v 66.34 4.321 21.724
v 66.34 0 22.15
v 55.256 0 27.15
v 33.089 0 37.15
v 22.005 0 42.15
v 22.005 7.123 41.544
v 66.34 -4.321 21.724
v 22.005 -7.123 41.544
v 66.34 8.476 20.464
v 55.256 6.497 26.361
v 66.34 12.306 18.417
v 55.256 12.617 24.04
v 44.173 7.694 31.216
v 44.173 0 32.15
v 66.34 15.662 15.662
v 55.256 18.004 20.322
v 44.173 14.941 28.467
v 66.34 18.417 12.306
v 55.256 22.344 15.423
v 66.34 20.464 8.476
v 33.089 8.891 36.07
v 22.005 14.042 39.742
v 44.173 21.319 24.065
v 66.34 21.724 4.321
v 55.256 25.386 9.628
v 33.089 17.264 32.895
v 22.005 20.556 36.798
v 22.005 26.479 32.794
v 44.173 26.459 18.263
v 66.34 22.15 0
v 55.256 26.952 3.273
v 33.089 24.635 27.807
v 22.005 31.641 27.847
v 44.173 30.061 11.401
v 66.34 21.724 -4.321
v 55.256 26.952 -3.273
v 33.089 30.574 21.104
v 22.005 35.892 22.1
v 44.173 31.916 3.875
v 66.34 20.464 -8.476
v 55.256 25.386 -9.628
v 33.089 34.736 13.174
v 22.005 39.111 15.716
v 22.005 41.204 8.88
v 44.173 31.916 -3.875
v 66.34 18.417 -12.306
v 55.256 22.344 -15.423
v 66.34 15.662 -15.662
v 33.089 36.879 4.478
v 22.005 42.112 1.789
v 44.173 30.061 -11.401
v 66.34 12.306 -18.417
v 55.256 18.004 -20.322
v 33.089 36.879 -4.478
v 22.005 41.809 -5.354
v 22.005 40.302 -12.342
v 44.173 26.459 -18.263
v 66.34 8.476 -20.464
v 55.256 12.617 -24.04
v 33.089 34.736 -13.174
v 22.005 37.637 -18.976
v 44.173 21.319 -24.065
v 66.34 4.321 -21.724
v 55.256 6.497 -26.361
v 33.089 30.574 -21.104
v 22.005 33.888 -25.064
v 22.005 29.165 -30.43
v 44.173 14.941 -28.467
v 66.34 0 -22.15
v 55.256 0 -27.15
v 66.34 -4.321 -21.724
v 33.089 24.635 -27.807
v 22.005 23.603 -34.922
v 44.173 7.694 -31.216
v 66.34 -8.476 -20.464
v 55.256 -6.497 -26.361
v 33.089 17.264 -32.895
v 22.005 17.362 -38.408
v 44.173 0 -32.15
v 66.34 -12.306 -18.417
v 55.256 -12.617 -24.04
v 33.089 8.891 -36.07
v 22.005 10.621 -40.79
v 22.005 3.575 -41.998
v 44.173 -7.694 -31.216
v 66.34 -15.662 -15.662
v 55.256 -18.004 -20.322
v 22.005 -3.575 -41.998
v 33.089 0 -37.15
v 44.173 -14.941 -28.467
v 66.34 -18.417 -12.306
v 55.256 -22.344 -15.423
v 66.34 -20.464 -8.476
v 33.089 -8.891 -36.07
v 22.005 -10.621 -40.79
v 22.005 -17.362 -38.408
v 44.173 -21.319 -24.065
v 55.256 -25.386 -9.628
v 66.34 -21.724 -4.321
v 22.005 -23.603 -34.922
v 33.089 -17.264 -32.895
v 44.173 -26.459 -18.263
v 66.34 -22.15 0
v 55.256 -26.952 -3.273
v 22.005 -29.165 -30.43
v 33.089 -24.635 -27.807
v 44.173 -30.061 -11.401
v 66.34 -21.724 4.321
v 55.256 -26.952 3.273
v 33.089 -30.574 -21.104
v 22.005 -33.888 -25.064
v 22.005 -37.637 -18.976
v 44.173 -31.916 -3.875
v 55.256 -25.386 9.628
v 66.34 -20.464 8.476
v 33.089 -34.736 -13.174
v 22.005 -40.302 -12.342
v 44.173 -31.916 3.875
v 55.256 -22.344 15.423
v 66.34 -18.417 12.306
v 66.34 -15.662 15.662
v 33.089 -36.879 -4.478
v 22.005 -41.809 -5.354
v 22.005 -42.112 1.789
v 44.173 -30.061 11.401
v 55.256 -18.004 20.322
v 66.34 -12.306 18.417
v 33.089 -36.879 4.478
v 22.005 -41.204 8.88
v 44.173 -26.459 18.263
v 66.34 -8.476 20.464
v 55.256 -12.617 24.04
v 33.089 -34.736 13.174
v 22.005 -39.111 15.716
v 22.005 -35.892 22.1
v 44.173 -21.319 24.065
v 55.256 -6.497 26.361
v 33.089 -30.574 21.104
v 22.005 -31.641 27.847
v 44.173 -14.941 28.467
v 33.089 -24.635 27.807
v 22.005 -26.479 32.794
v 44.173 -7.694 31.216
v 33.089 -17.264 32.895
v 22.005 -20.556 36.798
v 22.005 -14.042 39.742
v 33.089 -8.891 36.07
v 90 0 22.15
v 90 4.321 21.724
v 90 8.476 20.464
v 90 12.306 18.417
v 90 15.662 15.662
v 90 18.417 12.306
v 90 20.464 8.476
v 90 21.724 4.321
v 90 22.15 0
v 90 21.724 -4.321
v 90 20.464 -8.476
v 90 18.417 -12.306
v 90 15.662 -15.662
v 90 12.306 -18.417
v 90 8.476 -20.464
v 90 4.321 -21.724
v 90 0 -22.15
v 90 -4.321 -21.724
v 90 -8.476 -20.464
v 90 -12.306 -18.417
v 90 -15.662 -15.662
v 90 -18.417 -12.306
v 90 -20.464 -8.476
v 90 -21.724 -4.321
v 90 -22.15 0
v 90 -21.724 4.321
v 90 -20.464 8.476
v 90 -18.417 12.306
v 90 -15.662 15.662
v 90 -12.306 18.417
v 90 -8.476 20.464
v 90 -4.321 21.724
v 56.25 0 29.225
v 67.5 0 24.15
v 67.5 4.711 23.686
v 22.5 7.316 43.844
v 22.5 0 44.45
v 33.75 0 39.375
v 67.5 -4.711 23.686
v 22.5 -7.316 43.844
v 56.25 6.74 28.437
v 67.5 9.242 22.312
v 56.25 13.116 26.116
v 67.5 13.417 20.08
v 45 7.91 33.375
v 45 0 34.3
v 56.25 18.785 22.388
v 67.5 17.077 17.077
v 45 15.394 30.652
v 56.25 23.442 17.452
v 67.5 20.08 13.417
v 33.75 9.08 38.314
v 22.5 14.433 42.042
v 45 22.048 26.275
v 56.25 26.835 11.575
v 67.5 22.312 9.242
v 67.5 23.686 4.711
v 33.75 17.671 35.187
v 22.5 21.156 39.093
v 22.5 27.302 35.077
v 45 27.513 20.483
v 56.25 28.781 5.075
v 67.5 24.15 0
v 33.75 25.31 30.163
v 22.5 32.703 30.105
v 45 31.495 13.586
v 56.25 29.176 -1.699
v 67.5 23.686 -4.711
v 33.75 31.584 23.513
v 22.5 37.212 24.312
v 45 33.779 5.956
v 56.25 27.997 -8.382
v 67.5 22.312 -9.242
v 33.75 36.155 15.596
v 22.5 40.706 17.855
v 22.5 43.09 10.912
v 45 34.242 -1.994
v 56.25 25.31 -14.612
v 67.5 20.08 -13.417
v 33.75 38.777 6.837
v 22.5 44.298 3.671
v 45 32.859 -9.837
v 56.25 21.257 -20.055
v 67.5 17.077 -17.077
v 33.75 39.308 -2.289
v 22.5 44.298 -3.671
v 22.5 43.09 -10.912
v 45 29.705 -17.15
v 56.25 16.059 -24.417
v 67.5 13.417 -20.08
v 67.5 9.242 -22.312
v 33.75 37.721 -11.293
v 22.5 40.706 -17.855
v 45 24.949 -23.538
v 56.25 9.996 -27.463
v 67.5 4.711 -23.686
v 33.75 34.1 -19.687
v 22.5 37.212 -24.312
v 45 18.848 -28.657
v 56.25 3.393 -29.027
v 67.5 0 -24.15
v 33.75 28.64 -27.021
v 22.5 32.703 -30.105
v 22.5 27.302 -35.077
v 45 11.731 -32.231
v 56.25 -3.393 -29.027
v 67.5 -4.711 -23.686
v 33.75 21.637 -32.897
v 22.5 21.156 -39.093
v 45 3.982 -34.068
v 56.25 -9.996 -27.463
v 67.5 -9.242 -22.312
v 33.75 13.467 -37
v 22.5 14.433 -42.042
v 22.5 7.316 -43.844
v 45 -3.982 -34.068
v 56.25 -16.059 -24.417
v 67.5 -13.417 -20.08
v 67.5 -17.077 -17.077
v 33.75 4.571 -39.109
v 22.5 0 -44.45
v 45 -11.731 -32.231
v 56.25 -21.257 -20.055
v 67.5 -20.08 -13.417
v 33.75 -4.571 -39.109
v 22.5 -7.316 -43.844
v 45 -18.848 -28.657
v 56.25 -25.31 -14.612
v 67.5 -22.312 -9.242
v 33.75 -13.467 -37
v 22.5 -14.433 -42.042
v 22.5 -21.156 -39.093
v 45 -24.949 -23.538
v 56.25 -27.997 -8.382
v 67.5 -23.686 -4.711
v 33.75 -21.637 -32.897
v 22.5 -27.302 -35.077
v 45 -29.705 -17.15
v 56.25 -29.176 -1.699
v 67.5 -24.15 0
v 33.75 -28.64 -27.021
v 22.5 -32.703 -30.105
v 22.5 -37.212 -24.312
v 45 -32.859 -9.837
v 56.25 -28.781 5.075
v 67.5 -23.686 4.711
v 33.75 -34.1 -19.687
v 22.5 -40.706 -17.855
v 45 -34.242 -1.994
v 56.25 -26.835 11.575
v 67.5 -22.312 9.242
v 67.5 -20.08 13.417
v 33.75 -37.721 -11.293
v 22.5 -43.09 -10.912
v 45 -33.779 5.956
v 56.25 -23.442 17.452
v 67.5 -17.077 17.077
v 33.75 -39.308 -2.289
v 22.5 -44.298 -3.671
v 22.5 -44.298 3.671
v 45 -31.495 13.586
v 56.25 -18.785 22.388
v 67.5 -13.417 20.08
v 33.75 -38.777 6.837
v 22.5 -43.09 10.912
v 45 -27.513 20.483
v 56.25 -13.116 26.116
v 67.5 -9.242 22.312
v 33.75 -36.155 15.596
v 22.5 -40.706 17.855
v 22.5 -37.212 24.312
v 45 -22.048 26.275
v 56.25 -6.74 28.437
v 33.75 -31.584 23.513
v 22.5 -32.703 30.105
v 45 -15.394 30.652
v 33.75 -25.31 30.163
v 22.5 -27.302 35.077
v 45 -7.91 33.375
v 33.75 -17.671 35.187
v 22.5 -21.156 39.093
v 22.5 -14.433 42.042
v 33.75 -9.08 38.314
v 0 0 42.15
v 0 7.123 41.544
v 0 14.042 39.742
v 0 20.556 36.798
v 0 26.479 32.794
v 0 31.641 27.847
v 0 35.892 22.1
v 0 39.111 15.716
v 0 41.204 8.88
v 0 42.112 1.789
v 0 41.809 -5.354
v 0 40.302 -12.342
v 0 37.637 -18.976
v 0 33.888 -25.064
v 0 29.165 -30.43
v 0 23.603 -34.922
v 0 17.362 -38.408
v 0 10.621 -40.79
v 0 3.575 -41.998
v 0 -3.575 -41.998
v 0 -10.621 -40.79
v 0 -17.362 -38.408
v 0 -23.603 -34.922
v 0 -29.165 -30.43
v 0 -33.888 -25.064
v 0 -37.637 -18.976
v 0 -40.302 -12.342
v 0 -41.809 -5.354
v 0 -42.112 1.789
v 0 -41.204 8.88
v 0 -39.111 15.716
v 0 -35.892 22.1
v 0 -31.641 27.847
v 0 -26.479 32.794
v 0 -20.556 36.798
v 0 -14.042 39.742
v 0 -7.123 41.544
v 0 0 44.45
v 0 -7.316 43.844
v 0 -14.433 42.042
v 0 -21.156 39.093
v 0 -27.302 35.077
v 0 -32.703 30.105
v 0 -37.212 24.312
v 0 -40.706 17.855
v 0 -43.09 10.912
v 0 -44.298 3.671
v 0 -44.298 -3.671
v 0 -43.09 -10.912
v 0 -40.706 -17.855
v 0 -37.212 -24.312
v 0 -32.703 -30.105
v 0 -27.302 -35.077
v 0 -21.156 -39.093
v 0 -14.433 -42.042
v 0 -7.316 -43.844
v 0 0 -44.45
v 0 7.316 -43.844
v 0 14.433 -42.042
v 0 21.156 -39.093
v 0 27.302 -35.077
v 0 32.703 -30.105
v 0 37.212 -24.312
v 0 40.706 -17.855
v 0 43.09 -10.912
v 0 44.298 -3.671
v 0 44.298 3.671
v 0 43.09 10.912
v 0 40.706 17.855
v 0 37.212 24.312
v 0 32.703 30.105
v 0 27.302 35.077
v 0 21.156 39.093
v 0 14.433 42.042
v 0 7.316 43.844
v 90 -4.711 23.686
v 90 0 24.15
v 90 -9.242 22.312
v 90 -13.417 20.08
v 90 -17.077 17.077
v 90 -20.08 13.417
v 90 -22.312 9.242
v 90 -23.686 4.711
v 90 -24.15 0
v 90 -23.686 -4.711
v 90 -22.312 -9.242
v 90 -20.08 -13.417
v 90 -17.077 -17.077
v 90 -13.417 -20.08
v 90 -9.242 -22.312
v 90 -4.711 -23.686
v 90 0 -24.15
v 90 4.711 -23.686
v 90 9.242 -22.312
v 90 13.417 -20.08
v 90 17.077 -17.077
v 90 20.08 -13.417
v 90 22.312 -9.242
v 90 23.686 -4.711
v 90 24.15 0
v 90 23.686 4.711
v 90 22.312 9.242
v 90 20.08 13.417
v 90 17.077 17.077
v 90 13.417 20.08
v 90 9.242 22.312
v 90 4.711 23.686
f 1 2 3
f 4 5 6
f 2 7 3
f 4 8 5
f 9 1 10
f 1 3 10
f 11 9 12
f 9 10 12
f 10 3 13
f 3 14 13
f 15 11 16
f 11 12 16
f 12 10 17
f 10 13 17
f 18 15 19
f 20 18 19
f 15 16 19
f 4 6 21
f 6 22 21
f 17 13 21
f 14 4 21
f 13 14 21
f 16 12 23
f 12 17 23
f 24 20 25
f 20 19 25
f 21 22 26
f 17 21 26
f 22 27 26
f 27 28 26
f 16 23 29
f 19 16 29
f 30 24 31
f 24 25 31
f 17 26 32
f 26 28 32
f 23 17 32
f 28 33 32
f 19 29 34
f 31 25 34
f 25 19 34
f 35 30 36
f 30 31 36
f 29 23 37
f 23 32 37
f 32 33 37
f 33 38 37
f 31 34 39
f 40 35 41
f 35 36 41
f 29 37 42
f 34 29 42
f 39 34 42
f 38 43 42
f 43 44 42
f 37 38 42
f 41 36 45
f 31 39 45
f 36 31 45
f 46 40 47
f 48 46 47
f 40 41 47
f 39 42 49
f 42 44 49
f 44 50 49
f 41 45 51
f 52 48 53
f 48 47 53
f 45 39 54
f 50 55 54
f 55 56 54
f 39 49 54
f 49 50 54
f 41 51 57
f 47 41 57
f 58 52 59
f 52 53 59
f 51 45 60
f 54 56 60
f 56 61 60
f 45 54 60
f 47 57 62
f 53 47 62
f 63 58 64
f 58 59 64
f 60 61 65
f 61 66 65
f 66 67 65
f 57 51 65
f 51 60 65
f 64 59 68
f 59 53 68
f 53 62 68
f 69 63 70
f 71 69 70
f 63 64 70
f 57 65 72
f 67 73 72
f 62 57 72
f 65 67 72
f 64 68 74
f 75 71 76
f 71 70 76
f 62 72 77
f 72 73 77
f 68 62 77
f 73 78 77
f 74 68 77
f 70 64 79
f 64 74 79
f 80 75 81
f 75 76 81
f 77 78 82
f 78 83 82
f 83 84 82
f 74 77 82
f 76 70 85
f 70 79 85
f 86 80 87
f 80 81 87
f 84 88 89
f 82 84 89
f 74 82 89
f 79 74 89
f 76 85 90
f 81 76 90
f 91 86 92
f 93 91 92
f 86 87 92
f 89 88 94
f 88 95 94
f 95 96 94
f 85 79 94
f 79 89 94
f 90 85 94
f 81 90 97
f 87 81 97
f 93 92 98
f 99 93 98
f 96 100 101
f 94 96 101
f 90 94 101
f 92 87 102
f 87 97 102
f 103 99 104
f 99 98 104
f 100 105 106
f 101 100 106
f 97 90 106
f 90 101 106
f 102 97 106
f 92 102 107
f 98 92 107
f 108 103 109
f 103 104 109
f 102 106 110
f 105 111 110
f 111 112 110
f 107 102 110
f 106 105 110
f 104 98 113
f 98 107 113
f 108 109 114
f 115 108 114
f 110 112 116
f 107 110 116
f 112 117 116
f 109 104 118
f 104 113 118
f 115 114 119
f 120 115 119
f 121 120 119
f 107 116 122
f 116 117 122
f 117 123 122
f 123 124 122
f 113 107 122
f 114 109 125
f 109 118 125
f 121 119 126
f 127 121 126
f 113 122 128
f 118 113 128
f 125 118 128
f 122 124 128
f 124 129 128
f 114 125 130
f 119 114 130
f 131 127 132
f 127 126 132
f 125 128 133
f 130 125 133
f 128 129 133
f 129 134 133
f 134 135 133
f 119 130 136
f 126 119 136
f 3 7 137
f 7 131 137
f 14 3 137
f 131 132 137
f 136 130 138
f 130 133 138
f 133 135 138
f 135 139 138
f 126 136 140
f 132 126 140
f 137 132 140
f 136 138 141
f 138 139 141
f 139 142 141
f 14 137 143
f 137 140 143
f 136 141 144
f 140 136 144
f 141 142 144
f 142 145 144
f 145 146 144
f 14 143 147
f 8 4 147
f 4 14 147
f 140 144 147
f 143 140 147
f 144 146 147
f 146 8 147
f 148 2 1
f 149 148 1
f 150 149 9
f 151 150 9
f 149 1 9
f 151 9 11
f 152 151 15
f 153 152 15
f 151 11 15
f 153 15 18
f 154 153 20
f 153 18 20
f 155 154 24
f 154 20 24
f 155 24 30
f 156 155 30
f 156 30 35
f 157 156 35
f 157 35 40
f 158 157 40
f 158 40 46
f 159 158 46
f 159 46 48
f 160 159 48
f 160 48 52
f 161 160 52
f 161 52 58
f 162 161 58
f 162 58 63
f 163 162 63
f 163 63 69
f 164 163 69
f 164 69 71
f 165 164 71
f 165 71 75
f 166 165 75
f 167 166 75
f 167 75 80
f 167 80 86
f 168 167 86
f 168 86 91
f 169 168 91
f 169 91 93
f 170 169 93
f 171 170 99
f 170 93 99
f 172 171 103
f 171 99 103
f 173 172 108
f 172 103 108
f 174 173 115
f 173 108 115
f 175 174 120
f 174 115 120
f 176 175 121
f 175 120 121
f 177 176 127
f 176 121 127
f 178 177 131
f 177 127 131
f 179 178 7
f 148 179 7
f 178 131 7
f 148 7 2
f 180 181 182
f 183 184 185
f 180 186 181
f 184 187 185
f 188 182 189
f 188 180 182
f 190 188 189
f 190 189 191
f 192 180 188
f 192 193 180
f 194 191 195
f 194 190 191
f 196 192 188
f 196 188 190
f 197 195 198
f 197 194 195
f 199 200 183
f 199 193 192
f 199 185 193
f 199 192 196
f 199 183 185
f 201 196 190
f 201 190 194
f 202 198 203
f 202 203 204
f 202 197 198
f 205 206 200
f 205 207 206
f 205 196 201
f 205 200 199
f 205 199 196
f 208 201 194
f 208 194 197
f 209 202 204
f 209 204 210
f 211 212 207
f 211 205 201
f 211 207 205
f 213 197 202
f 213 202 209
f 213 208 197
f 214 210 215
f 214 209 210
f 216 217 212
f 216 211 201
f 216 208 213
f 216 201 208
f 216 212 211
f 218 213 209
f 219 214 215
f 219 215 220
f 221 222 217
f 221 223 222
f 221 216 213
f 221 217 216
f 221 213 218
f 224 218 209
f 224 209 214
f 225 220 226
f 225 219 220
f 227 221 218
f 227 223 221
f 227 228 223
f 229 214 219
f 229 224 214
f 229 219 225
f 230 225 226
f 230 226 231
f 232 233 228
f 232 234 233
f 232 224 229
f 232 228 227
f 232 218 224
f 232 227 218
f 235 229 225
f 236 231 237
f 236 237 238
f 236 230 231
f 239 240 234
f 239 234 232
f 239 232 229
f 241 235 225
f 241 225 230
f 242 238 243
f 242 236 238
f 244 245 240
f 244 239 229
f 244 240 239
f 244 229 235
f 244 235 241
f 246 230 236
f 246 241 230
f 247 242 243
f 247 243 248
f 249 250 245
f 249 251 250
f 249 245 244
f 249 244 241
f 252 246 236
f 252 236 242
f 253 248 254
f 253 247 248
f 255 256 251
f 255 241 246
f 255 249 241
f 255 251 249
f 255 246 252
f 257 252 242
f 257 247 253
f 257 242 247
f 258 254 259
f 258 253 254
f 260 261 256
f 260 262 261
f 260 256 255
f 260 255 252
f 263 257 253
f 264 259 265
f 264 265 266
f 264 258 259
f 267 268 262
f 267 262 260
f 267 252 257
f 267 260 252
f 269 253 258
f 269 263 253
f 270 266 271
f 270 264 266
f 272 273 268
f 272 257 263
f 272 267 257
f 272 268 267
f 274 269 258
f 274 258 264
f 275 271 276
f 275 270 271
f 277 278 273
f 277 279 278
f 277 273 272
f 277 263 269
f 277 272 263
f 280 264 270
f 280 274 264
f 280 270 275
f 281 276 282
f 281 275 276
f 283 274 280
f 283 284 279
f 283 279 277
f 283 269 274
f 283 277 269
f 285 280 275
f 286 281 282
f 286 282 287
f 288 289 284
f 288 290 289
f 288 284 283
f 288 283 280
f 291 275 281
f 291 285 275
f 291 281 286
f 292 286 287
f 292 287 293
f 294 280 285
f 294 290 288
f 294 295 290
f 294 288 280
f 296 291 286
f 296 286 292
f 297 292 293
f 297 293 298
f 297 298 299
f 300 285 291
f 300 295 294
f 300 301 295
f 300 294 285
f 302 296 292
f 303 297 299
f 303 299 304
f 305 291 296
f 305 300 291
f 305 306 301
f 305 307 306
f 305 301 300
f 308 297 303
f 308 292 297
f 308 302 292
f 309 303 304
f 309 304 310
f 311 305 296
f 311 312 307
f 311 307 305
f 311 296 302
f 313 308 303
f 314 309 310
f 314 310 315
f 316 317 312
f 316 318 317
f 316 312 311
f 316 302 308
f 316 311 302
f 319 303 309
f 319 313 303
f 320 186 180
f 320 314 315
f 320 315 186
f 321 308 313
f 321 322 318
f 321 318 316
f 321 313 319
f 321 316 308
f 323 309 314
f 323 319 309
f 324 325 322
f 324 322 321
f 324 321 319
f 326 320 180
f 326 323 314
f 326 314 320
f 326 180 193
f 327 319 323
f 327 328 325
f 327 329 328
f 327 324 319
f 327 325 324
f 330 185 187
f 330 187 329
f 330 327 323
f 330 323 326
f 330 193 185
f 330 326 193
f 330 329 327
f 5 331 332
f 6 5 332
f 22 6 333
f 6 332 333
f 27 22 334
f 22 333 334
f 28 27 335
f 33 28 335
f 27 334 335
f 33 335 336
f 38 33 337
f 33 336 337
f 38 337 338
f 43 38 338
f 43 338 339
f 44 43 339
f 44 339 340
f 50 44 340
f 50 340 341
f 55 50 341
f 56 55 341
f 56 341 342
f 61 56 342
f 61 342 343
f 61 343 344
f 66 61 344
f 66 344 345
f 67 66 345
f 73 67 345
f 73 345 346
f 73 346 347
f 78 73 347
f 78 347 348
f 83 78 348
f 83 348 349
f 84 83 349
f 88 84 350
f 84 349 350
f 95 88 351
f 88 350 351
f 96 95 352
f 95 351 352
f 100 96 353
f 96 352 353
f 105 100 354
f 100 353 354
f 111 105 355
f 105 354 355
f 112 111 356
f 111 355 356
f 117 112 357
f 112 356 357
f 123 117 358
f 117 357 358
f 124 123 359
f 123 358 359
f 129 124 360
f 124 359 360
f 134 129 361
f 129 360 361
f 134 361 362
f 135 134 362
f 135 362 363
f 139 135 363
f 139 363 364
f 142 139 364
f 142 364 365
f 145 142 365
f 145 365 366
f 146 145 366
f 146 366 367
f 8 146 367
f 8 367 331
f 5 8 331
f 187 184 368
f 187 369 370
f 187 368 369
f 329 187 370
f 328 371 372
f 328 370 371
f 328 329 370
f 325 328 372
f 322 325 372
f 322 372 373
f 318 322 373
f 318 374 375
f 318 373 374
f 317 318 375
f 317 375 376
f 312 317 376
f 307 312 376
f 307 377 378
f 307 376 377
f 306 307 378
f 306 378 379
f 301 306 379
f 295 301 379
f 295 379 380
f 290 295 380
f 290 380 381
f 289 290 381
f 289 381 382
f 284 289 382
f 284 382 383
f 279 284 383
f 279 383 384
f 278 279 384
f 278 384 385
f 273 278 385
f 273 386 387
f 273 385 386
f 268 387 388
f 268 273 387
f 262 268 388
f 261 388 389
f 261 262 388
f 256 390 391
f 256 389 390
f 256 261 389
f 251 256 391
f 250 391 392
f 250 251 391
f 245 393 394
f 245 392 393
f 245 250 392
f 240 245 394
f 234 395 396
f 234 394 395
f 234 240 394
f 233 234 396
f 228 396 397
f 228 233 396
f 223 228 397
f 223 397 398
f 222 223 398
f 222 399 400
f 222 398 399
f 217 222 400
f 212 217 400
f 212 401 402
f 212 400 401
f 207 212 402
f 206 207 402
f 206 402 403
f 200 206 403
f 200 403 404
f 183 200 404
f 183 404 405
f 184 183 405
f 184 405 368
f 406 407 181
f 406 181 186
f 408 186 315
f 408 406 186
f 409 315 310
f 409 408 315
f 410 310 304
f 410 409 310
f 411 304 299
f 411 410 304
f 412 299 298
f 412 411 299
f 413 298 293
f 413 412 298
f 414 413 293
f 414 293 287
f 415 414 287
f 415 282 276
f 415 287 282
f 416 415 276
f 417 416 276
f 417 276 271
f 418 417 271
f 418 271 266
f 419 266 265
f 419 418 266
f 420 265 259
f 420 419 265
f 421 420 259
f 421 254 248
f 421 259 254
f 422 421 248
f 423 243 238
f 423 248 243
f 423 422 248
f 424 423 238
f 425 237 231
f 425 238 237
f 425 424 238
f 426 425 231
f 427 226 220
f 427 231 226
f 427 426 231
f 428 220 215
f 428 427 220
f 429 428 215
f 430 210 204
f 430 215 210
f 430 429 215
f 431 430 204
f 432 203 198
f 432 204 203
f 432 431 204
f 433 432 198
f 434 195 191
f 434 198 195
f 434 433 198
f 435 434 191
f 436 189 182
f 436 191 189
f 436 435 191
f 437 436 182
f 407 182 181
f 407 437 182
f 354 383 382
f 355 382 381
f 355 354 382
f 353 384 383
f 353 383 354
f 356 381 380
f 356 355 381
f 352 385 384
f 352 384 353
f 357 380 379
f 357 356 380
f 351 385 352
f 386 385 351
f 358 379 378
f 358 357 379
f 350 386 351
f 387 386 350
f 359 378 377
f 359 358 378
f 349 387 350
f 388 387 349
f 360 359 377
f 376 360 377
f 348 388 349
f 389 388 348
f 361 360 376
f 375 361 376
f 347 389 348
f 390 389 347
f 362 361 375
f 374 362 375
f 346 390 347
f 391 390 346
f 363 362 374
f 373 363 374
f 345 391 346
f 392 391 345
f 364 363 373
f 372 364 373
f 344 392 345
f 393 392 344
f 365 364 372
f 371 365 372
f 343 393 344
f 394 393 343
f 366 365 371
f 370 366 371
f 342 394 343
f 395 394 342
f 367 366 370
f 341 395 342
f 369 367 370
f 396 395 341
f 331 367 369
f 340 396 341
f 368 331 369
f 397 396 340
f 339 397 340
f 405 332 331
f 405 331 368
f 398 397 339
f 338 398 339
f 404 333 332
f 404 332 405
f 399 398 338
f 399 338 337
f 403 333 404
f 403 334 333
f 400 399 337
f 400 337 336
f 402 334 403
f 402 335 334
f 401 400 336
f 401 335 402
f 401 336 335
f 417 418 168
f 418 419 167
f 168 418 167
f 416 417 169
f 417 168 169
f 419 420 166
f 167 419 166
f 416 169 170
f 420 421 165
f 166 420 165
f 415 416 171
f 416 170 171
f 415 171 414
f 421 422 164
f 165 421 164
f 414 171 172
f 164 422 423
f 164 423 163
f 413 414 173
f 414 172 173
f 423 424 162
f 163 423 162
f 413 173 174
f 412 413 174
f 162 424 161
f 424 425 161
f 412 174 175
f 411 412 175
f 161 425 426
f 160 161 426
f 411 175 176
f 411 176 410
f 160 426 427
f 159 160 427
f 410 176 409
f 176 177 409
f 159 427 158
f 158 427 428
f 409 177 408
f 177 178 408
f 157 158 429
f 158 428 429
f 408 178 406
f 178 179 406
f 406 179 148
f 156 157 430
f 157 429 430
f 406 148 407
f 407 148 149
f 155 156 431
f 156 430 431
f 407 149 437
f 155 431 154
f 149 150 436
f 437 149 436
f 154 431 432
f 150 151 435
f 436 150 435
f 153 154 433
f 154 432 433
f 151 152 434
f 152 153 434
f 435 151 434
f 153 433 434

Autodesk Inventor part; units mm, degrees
ref_plane "YZ Plane" through (0, 0, 0) normal (1, 0, 0) x (0, 1, 0)
ref_plane "XZ Plane" through (0, 0, 0) normal (0, 1, 0) x (-1, 0, 0)
ref_plane "XY Plane" through (0, 0, 0) normal (0, 0, 1) x (1, 0, 0)
sketch "Sketch1" plane through (0, 0, 0) normal (0, 1, 0) x (-1, 0, 0)
  line L0 (0, 44.45) -> (-22.5, 44.45)
  line L1 (-22.5, 44.45) -> (-67.5, 24.15)
  line L2 (-67.5, 24.15) -> (-90, 24.15)
  line L3 (-90, 0) -> (0, 0)
  line L4 (-90, 22.15) -> (-66.3402, 22.15)
  line L5 (-66.3402, 22.15) -> (-22.0052, 42.15)
  line L6 (-22.0052, 42.15) -> (0, 42.15)
  line L7 (-90, 0) -> (-90, 22.15) construction
  line L8 (-90, 24.15) -> (-90, 22.15)
  line L9 (0, 44.45) -> (0, 42.15)
  line L10 (0, 0) -> (0, 42.15) construction
  line L11 (-45, 34.3) -> (-44.0542, 32.2035) construction
  dimension "d0" = 88.9
  dimension "d1" = 48.3
  dimension "d2" = 2.3
  dimension "d3" = 2
  dimension "d4" = 90
  dimension "d5" = 22.5
  dimension "d6" = 22.5
  dimension "d10" = 2.3
revolve "Revolution1" add sketch "Sketch1" angle 360 about axis through (90, 0, 0) along (-1, 0, 0)
equation "\"d0\" = D1"
equation "\"d1\" = D2"
equation "\"d2\" = s1"
equation "\"d3\" = s2"
equation "\"d4\" = L"
equation "\"d5\" = 0.25 * L"
equation "\"d6\" = 0.25 * L"
equation "\"d10\" = s3"
equation "\"s1\" = 2.3"
equation "\"D1\" = 88.9"
equation "\"D2\" = 48.3"
equation "\"L\" = 90"
equation "\"s2\" = 2"
equation "\"s3\" = 2.3"
equation "\"Size_Designation\" = 1.2345"
properties part number "DIN 2616 Concentric Reducer (K) 88.9 x 2.3 - 48.3 x 2" material "Steel"
